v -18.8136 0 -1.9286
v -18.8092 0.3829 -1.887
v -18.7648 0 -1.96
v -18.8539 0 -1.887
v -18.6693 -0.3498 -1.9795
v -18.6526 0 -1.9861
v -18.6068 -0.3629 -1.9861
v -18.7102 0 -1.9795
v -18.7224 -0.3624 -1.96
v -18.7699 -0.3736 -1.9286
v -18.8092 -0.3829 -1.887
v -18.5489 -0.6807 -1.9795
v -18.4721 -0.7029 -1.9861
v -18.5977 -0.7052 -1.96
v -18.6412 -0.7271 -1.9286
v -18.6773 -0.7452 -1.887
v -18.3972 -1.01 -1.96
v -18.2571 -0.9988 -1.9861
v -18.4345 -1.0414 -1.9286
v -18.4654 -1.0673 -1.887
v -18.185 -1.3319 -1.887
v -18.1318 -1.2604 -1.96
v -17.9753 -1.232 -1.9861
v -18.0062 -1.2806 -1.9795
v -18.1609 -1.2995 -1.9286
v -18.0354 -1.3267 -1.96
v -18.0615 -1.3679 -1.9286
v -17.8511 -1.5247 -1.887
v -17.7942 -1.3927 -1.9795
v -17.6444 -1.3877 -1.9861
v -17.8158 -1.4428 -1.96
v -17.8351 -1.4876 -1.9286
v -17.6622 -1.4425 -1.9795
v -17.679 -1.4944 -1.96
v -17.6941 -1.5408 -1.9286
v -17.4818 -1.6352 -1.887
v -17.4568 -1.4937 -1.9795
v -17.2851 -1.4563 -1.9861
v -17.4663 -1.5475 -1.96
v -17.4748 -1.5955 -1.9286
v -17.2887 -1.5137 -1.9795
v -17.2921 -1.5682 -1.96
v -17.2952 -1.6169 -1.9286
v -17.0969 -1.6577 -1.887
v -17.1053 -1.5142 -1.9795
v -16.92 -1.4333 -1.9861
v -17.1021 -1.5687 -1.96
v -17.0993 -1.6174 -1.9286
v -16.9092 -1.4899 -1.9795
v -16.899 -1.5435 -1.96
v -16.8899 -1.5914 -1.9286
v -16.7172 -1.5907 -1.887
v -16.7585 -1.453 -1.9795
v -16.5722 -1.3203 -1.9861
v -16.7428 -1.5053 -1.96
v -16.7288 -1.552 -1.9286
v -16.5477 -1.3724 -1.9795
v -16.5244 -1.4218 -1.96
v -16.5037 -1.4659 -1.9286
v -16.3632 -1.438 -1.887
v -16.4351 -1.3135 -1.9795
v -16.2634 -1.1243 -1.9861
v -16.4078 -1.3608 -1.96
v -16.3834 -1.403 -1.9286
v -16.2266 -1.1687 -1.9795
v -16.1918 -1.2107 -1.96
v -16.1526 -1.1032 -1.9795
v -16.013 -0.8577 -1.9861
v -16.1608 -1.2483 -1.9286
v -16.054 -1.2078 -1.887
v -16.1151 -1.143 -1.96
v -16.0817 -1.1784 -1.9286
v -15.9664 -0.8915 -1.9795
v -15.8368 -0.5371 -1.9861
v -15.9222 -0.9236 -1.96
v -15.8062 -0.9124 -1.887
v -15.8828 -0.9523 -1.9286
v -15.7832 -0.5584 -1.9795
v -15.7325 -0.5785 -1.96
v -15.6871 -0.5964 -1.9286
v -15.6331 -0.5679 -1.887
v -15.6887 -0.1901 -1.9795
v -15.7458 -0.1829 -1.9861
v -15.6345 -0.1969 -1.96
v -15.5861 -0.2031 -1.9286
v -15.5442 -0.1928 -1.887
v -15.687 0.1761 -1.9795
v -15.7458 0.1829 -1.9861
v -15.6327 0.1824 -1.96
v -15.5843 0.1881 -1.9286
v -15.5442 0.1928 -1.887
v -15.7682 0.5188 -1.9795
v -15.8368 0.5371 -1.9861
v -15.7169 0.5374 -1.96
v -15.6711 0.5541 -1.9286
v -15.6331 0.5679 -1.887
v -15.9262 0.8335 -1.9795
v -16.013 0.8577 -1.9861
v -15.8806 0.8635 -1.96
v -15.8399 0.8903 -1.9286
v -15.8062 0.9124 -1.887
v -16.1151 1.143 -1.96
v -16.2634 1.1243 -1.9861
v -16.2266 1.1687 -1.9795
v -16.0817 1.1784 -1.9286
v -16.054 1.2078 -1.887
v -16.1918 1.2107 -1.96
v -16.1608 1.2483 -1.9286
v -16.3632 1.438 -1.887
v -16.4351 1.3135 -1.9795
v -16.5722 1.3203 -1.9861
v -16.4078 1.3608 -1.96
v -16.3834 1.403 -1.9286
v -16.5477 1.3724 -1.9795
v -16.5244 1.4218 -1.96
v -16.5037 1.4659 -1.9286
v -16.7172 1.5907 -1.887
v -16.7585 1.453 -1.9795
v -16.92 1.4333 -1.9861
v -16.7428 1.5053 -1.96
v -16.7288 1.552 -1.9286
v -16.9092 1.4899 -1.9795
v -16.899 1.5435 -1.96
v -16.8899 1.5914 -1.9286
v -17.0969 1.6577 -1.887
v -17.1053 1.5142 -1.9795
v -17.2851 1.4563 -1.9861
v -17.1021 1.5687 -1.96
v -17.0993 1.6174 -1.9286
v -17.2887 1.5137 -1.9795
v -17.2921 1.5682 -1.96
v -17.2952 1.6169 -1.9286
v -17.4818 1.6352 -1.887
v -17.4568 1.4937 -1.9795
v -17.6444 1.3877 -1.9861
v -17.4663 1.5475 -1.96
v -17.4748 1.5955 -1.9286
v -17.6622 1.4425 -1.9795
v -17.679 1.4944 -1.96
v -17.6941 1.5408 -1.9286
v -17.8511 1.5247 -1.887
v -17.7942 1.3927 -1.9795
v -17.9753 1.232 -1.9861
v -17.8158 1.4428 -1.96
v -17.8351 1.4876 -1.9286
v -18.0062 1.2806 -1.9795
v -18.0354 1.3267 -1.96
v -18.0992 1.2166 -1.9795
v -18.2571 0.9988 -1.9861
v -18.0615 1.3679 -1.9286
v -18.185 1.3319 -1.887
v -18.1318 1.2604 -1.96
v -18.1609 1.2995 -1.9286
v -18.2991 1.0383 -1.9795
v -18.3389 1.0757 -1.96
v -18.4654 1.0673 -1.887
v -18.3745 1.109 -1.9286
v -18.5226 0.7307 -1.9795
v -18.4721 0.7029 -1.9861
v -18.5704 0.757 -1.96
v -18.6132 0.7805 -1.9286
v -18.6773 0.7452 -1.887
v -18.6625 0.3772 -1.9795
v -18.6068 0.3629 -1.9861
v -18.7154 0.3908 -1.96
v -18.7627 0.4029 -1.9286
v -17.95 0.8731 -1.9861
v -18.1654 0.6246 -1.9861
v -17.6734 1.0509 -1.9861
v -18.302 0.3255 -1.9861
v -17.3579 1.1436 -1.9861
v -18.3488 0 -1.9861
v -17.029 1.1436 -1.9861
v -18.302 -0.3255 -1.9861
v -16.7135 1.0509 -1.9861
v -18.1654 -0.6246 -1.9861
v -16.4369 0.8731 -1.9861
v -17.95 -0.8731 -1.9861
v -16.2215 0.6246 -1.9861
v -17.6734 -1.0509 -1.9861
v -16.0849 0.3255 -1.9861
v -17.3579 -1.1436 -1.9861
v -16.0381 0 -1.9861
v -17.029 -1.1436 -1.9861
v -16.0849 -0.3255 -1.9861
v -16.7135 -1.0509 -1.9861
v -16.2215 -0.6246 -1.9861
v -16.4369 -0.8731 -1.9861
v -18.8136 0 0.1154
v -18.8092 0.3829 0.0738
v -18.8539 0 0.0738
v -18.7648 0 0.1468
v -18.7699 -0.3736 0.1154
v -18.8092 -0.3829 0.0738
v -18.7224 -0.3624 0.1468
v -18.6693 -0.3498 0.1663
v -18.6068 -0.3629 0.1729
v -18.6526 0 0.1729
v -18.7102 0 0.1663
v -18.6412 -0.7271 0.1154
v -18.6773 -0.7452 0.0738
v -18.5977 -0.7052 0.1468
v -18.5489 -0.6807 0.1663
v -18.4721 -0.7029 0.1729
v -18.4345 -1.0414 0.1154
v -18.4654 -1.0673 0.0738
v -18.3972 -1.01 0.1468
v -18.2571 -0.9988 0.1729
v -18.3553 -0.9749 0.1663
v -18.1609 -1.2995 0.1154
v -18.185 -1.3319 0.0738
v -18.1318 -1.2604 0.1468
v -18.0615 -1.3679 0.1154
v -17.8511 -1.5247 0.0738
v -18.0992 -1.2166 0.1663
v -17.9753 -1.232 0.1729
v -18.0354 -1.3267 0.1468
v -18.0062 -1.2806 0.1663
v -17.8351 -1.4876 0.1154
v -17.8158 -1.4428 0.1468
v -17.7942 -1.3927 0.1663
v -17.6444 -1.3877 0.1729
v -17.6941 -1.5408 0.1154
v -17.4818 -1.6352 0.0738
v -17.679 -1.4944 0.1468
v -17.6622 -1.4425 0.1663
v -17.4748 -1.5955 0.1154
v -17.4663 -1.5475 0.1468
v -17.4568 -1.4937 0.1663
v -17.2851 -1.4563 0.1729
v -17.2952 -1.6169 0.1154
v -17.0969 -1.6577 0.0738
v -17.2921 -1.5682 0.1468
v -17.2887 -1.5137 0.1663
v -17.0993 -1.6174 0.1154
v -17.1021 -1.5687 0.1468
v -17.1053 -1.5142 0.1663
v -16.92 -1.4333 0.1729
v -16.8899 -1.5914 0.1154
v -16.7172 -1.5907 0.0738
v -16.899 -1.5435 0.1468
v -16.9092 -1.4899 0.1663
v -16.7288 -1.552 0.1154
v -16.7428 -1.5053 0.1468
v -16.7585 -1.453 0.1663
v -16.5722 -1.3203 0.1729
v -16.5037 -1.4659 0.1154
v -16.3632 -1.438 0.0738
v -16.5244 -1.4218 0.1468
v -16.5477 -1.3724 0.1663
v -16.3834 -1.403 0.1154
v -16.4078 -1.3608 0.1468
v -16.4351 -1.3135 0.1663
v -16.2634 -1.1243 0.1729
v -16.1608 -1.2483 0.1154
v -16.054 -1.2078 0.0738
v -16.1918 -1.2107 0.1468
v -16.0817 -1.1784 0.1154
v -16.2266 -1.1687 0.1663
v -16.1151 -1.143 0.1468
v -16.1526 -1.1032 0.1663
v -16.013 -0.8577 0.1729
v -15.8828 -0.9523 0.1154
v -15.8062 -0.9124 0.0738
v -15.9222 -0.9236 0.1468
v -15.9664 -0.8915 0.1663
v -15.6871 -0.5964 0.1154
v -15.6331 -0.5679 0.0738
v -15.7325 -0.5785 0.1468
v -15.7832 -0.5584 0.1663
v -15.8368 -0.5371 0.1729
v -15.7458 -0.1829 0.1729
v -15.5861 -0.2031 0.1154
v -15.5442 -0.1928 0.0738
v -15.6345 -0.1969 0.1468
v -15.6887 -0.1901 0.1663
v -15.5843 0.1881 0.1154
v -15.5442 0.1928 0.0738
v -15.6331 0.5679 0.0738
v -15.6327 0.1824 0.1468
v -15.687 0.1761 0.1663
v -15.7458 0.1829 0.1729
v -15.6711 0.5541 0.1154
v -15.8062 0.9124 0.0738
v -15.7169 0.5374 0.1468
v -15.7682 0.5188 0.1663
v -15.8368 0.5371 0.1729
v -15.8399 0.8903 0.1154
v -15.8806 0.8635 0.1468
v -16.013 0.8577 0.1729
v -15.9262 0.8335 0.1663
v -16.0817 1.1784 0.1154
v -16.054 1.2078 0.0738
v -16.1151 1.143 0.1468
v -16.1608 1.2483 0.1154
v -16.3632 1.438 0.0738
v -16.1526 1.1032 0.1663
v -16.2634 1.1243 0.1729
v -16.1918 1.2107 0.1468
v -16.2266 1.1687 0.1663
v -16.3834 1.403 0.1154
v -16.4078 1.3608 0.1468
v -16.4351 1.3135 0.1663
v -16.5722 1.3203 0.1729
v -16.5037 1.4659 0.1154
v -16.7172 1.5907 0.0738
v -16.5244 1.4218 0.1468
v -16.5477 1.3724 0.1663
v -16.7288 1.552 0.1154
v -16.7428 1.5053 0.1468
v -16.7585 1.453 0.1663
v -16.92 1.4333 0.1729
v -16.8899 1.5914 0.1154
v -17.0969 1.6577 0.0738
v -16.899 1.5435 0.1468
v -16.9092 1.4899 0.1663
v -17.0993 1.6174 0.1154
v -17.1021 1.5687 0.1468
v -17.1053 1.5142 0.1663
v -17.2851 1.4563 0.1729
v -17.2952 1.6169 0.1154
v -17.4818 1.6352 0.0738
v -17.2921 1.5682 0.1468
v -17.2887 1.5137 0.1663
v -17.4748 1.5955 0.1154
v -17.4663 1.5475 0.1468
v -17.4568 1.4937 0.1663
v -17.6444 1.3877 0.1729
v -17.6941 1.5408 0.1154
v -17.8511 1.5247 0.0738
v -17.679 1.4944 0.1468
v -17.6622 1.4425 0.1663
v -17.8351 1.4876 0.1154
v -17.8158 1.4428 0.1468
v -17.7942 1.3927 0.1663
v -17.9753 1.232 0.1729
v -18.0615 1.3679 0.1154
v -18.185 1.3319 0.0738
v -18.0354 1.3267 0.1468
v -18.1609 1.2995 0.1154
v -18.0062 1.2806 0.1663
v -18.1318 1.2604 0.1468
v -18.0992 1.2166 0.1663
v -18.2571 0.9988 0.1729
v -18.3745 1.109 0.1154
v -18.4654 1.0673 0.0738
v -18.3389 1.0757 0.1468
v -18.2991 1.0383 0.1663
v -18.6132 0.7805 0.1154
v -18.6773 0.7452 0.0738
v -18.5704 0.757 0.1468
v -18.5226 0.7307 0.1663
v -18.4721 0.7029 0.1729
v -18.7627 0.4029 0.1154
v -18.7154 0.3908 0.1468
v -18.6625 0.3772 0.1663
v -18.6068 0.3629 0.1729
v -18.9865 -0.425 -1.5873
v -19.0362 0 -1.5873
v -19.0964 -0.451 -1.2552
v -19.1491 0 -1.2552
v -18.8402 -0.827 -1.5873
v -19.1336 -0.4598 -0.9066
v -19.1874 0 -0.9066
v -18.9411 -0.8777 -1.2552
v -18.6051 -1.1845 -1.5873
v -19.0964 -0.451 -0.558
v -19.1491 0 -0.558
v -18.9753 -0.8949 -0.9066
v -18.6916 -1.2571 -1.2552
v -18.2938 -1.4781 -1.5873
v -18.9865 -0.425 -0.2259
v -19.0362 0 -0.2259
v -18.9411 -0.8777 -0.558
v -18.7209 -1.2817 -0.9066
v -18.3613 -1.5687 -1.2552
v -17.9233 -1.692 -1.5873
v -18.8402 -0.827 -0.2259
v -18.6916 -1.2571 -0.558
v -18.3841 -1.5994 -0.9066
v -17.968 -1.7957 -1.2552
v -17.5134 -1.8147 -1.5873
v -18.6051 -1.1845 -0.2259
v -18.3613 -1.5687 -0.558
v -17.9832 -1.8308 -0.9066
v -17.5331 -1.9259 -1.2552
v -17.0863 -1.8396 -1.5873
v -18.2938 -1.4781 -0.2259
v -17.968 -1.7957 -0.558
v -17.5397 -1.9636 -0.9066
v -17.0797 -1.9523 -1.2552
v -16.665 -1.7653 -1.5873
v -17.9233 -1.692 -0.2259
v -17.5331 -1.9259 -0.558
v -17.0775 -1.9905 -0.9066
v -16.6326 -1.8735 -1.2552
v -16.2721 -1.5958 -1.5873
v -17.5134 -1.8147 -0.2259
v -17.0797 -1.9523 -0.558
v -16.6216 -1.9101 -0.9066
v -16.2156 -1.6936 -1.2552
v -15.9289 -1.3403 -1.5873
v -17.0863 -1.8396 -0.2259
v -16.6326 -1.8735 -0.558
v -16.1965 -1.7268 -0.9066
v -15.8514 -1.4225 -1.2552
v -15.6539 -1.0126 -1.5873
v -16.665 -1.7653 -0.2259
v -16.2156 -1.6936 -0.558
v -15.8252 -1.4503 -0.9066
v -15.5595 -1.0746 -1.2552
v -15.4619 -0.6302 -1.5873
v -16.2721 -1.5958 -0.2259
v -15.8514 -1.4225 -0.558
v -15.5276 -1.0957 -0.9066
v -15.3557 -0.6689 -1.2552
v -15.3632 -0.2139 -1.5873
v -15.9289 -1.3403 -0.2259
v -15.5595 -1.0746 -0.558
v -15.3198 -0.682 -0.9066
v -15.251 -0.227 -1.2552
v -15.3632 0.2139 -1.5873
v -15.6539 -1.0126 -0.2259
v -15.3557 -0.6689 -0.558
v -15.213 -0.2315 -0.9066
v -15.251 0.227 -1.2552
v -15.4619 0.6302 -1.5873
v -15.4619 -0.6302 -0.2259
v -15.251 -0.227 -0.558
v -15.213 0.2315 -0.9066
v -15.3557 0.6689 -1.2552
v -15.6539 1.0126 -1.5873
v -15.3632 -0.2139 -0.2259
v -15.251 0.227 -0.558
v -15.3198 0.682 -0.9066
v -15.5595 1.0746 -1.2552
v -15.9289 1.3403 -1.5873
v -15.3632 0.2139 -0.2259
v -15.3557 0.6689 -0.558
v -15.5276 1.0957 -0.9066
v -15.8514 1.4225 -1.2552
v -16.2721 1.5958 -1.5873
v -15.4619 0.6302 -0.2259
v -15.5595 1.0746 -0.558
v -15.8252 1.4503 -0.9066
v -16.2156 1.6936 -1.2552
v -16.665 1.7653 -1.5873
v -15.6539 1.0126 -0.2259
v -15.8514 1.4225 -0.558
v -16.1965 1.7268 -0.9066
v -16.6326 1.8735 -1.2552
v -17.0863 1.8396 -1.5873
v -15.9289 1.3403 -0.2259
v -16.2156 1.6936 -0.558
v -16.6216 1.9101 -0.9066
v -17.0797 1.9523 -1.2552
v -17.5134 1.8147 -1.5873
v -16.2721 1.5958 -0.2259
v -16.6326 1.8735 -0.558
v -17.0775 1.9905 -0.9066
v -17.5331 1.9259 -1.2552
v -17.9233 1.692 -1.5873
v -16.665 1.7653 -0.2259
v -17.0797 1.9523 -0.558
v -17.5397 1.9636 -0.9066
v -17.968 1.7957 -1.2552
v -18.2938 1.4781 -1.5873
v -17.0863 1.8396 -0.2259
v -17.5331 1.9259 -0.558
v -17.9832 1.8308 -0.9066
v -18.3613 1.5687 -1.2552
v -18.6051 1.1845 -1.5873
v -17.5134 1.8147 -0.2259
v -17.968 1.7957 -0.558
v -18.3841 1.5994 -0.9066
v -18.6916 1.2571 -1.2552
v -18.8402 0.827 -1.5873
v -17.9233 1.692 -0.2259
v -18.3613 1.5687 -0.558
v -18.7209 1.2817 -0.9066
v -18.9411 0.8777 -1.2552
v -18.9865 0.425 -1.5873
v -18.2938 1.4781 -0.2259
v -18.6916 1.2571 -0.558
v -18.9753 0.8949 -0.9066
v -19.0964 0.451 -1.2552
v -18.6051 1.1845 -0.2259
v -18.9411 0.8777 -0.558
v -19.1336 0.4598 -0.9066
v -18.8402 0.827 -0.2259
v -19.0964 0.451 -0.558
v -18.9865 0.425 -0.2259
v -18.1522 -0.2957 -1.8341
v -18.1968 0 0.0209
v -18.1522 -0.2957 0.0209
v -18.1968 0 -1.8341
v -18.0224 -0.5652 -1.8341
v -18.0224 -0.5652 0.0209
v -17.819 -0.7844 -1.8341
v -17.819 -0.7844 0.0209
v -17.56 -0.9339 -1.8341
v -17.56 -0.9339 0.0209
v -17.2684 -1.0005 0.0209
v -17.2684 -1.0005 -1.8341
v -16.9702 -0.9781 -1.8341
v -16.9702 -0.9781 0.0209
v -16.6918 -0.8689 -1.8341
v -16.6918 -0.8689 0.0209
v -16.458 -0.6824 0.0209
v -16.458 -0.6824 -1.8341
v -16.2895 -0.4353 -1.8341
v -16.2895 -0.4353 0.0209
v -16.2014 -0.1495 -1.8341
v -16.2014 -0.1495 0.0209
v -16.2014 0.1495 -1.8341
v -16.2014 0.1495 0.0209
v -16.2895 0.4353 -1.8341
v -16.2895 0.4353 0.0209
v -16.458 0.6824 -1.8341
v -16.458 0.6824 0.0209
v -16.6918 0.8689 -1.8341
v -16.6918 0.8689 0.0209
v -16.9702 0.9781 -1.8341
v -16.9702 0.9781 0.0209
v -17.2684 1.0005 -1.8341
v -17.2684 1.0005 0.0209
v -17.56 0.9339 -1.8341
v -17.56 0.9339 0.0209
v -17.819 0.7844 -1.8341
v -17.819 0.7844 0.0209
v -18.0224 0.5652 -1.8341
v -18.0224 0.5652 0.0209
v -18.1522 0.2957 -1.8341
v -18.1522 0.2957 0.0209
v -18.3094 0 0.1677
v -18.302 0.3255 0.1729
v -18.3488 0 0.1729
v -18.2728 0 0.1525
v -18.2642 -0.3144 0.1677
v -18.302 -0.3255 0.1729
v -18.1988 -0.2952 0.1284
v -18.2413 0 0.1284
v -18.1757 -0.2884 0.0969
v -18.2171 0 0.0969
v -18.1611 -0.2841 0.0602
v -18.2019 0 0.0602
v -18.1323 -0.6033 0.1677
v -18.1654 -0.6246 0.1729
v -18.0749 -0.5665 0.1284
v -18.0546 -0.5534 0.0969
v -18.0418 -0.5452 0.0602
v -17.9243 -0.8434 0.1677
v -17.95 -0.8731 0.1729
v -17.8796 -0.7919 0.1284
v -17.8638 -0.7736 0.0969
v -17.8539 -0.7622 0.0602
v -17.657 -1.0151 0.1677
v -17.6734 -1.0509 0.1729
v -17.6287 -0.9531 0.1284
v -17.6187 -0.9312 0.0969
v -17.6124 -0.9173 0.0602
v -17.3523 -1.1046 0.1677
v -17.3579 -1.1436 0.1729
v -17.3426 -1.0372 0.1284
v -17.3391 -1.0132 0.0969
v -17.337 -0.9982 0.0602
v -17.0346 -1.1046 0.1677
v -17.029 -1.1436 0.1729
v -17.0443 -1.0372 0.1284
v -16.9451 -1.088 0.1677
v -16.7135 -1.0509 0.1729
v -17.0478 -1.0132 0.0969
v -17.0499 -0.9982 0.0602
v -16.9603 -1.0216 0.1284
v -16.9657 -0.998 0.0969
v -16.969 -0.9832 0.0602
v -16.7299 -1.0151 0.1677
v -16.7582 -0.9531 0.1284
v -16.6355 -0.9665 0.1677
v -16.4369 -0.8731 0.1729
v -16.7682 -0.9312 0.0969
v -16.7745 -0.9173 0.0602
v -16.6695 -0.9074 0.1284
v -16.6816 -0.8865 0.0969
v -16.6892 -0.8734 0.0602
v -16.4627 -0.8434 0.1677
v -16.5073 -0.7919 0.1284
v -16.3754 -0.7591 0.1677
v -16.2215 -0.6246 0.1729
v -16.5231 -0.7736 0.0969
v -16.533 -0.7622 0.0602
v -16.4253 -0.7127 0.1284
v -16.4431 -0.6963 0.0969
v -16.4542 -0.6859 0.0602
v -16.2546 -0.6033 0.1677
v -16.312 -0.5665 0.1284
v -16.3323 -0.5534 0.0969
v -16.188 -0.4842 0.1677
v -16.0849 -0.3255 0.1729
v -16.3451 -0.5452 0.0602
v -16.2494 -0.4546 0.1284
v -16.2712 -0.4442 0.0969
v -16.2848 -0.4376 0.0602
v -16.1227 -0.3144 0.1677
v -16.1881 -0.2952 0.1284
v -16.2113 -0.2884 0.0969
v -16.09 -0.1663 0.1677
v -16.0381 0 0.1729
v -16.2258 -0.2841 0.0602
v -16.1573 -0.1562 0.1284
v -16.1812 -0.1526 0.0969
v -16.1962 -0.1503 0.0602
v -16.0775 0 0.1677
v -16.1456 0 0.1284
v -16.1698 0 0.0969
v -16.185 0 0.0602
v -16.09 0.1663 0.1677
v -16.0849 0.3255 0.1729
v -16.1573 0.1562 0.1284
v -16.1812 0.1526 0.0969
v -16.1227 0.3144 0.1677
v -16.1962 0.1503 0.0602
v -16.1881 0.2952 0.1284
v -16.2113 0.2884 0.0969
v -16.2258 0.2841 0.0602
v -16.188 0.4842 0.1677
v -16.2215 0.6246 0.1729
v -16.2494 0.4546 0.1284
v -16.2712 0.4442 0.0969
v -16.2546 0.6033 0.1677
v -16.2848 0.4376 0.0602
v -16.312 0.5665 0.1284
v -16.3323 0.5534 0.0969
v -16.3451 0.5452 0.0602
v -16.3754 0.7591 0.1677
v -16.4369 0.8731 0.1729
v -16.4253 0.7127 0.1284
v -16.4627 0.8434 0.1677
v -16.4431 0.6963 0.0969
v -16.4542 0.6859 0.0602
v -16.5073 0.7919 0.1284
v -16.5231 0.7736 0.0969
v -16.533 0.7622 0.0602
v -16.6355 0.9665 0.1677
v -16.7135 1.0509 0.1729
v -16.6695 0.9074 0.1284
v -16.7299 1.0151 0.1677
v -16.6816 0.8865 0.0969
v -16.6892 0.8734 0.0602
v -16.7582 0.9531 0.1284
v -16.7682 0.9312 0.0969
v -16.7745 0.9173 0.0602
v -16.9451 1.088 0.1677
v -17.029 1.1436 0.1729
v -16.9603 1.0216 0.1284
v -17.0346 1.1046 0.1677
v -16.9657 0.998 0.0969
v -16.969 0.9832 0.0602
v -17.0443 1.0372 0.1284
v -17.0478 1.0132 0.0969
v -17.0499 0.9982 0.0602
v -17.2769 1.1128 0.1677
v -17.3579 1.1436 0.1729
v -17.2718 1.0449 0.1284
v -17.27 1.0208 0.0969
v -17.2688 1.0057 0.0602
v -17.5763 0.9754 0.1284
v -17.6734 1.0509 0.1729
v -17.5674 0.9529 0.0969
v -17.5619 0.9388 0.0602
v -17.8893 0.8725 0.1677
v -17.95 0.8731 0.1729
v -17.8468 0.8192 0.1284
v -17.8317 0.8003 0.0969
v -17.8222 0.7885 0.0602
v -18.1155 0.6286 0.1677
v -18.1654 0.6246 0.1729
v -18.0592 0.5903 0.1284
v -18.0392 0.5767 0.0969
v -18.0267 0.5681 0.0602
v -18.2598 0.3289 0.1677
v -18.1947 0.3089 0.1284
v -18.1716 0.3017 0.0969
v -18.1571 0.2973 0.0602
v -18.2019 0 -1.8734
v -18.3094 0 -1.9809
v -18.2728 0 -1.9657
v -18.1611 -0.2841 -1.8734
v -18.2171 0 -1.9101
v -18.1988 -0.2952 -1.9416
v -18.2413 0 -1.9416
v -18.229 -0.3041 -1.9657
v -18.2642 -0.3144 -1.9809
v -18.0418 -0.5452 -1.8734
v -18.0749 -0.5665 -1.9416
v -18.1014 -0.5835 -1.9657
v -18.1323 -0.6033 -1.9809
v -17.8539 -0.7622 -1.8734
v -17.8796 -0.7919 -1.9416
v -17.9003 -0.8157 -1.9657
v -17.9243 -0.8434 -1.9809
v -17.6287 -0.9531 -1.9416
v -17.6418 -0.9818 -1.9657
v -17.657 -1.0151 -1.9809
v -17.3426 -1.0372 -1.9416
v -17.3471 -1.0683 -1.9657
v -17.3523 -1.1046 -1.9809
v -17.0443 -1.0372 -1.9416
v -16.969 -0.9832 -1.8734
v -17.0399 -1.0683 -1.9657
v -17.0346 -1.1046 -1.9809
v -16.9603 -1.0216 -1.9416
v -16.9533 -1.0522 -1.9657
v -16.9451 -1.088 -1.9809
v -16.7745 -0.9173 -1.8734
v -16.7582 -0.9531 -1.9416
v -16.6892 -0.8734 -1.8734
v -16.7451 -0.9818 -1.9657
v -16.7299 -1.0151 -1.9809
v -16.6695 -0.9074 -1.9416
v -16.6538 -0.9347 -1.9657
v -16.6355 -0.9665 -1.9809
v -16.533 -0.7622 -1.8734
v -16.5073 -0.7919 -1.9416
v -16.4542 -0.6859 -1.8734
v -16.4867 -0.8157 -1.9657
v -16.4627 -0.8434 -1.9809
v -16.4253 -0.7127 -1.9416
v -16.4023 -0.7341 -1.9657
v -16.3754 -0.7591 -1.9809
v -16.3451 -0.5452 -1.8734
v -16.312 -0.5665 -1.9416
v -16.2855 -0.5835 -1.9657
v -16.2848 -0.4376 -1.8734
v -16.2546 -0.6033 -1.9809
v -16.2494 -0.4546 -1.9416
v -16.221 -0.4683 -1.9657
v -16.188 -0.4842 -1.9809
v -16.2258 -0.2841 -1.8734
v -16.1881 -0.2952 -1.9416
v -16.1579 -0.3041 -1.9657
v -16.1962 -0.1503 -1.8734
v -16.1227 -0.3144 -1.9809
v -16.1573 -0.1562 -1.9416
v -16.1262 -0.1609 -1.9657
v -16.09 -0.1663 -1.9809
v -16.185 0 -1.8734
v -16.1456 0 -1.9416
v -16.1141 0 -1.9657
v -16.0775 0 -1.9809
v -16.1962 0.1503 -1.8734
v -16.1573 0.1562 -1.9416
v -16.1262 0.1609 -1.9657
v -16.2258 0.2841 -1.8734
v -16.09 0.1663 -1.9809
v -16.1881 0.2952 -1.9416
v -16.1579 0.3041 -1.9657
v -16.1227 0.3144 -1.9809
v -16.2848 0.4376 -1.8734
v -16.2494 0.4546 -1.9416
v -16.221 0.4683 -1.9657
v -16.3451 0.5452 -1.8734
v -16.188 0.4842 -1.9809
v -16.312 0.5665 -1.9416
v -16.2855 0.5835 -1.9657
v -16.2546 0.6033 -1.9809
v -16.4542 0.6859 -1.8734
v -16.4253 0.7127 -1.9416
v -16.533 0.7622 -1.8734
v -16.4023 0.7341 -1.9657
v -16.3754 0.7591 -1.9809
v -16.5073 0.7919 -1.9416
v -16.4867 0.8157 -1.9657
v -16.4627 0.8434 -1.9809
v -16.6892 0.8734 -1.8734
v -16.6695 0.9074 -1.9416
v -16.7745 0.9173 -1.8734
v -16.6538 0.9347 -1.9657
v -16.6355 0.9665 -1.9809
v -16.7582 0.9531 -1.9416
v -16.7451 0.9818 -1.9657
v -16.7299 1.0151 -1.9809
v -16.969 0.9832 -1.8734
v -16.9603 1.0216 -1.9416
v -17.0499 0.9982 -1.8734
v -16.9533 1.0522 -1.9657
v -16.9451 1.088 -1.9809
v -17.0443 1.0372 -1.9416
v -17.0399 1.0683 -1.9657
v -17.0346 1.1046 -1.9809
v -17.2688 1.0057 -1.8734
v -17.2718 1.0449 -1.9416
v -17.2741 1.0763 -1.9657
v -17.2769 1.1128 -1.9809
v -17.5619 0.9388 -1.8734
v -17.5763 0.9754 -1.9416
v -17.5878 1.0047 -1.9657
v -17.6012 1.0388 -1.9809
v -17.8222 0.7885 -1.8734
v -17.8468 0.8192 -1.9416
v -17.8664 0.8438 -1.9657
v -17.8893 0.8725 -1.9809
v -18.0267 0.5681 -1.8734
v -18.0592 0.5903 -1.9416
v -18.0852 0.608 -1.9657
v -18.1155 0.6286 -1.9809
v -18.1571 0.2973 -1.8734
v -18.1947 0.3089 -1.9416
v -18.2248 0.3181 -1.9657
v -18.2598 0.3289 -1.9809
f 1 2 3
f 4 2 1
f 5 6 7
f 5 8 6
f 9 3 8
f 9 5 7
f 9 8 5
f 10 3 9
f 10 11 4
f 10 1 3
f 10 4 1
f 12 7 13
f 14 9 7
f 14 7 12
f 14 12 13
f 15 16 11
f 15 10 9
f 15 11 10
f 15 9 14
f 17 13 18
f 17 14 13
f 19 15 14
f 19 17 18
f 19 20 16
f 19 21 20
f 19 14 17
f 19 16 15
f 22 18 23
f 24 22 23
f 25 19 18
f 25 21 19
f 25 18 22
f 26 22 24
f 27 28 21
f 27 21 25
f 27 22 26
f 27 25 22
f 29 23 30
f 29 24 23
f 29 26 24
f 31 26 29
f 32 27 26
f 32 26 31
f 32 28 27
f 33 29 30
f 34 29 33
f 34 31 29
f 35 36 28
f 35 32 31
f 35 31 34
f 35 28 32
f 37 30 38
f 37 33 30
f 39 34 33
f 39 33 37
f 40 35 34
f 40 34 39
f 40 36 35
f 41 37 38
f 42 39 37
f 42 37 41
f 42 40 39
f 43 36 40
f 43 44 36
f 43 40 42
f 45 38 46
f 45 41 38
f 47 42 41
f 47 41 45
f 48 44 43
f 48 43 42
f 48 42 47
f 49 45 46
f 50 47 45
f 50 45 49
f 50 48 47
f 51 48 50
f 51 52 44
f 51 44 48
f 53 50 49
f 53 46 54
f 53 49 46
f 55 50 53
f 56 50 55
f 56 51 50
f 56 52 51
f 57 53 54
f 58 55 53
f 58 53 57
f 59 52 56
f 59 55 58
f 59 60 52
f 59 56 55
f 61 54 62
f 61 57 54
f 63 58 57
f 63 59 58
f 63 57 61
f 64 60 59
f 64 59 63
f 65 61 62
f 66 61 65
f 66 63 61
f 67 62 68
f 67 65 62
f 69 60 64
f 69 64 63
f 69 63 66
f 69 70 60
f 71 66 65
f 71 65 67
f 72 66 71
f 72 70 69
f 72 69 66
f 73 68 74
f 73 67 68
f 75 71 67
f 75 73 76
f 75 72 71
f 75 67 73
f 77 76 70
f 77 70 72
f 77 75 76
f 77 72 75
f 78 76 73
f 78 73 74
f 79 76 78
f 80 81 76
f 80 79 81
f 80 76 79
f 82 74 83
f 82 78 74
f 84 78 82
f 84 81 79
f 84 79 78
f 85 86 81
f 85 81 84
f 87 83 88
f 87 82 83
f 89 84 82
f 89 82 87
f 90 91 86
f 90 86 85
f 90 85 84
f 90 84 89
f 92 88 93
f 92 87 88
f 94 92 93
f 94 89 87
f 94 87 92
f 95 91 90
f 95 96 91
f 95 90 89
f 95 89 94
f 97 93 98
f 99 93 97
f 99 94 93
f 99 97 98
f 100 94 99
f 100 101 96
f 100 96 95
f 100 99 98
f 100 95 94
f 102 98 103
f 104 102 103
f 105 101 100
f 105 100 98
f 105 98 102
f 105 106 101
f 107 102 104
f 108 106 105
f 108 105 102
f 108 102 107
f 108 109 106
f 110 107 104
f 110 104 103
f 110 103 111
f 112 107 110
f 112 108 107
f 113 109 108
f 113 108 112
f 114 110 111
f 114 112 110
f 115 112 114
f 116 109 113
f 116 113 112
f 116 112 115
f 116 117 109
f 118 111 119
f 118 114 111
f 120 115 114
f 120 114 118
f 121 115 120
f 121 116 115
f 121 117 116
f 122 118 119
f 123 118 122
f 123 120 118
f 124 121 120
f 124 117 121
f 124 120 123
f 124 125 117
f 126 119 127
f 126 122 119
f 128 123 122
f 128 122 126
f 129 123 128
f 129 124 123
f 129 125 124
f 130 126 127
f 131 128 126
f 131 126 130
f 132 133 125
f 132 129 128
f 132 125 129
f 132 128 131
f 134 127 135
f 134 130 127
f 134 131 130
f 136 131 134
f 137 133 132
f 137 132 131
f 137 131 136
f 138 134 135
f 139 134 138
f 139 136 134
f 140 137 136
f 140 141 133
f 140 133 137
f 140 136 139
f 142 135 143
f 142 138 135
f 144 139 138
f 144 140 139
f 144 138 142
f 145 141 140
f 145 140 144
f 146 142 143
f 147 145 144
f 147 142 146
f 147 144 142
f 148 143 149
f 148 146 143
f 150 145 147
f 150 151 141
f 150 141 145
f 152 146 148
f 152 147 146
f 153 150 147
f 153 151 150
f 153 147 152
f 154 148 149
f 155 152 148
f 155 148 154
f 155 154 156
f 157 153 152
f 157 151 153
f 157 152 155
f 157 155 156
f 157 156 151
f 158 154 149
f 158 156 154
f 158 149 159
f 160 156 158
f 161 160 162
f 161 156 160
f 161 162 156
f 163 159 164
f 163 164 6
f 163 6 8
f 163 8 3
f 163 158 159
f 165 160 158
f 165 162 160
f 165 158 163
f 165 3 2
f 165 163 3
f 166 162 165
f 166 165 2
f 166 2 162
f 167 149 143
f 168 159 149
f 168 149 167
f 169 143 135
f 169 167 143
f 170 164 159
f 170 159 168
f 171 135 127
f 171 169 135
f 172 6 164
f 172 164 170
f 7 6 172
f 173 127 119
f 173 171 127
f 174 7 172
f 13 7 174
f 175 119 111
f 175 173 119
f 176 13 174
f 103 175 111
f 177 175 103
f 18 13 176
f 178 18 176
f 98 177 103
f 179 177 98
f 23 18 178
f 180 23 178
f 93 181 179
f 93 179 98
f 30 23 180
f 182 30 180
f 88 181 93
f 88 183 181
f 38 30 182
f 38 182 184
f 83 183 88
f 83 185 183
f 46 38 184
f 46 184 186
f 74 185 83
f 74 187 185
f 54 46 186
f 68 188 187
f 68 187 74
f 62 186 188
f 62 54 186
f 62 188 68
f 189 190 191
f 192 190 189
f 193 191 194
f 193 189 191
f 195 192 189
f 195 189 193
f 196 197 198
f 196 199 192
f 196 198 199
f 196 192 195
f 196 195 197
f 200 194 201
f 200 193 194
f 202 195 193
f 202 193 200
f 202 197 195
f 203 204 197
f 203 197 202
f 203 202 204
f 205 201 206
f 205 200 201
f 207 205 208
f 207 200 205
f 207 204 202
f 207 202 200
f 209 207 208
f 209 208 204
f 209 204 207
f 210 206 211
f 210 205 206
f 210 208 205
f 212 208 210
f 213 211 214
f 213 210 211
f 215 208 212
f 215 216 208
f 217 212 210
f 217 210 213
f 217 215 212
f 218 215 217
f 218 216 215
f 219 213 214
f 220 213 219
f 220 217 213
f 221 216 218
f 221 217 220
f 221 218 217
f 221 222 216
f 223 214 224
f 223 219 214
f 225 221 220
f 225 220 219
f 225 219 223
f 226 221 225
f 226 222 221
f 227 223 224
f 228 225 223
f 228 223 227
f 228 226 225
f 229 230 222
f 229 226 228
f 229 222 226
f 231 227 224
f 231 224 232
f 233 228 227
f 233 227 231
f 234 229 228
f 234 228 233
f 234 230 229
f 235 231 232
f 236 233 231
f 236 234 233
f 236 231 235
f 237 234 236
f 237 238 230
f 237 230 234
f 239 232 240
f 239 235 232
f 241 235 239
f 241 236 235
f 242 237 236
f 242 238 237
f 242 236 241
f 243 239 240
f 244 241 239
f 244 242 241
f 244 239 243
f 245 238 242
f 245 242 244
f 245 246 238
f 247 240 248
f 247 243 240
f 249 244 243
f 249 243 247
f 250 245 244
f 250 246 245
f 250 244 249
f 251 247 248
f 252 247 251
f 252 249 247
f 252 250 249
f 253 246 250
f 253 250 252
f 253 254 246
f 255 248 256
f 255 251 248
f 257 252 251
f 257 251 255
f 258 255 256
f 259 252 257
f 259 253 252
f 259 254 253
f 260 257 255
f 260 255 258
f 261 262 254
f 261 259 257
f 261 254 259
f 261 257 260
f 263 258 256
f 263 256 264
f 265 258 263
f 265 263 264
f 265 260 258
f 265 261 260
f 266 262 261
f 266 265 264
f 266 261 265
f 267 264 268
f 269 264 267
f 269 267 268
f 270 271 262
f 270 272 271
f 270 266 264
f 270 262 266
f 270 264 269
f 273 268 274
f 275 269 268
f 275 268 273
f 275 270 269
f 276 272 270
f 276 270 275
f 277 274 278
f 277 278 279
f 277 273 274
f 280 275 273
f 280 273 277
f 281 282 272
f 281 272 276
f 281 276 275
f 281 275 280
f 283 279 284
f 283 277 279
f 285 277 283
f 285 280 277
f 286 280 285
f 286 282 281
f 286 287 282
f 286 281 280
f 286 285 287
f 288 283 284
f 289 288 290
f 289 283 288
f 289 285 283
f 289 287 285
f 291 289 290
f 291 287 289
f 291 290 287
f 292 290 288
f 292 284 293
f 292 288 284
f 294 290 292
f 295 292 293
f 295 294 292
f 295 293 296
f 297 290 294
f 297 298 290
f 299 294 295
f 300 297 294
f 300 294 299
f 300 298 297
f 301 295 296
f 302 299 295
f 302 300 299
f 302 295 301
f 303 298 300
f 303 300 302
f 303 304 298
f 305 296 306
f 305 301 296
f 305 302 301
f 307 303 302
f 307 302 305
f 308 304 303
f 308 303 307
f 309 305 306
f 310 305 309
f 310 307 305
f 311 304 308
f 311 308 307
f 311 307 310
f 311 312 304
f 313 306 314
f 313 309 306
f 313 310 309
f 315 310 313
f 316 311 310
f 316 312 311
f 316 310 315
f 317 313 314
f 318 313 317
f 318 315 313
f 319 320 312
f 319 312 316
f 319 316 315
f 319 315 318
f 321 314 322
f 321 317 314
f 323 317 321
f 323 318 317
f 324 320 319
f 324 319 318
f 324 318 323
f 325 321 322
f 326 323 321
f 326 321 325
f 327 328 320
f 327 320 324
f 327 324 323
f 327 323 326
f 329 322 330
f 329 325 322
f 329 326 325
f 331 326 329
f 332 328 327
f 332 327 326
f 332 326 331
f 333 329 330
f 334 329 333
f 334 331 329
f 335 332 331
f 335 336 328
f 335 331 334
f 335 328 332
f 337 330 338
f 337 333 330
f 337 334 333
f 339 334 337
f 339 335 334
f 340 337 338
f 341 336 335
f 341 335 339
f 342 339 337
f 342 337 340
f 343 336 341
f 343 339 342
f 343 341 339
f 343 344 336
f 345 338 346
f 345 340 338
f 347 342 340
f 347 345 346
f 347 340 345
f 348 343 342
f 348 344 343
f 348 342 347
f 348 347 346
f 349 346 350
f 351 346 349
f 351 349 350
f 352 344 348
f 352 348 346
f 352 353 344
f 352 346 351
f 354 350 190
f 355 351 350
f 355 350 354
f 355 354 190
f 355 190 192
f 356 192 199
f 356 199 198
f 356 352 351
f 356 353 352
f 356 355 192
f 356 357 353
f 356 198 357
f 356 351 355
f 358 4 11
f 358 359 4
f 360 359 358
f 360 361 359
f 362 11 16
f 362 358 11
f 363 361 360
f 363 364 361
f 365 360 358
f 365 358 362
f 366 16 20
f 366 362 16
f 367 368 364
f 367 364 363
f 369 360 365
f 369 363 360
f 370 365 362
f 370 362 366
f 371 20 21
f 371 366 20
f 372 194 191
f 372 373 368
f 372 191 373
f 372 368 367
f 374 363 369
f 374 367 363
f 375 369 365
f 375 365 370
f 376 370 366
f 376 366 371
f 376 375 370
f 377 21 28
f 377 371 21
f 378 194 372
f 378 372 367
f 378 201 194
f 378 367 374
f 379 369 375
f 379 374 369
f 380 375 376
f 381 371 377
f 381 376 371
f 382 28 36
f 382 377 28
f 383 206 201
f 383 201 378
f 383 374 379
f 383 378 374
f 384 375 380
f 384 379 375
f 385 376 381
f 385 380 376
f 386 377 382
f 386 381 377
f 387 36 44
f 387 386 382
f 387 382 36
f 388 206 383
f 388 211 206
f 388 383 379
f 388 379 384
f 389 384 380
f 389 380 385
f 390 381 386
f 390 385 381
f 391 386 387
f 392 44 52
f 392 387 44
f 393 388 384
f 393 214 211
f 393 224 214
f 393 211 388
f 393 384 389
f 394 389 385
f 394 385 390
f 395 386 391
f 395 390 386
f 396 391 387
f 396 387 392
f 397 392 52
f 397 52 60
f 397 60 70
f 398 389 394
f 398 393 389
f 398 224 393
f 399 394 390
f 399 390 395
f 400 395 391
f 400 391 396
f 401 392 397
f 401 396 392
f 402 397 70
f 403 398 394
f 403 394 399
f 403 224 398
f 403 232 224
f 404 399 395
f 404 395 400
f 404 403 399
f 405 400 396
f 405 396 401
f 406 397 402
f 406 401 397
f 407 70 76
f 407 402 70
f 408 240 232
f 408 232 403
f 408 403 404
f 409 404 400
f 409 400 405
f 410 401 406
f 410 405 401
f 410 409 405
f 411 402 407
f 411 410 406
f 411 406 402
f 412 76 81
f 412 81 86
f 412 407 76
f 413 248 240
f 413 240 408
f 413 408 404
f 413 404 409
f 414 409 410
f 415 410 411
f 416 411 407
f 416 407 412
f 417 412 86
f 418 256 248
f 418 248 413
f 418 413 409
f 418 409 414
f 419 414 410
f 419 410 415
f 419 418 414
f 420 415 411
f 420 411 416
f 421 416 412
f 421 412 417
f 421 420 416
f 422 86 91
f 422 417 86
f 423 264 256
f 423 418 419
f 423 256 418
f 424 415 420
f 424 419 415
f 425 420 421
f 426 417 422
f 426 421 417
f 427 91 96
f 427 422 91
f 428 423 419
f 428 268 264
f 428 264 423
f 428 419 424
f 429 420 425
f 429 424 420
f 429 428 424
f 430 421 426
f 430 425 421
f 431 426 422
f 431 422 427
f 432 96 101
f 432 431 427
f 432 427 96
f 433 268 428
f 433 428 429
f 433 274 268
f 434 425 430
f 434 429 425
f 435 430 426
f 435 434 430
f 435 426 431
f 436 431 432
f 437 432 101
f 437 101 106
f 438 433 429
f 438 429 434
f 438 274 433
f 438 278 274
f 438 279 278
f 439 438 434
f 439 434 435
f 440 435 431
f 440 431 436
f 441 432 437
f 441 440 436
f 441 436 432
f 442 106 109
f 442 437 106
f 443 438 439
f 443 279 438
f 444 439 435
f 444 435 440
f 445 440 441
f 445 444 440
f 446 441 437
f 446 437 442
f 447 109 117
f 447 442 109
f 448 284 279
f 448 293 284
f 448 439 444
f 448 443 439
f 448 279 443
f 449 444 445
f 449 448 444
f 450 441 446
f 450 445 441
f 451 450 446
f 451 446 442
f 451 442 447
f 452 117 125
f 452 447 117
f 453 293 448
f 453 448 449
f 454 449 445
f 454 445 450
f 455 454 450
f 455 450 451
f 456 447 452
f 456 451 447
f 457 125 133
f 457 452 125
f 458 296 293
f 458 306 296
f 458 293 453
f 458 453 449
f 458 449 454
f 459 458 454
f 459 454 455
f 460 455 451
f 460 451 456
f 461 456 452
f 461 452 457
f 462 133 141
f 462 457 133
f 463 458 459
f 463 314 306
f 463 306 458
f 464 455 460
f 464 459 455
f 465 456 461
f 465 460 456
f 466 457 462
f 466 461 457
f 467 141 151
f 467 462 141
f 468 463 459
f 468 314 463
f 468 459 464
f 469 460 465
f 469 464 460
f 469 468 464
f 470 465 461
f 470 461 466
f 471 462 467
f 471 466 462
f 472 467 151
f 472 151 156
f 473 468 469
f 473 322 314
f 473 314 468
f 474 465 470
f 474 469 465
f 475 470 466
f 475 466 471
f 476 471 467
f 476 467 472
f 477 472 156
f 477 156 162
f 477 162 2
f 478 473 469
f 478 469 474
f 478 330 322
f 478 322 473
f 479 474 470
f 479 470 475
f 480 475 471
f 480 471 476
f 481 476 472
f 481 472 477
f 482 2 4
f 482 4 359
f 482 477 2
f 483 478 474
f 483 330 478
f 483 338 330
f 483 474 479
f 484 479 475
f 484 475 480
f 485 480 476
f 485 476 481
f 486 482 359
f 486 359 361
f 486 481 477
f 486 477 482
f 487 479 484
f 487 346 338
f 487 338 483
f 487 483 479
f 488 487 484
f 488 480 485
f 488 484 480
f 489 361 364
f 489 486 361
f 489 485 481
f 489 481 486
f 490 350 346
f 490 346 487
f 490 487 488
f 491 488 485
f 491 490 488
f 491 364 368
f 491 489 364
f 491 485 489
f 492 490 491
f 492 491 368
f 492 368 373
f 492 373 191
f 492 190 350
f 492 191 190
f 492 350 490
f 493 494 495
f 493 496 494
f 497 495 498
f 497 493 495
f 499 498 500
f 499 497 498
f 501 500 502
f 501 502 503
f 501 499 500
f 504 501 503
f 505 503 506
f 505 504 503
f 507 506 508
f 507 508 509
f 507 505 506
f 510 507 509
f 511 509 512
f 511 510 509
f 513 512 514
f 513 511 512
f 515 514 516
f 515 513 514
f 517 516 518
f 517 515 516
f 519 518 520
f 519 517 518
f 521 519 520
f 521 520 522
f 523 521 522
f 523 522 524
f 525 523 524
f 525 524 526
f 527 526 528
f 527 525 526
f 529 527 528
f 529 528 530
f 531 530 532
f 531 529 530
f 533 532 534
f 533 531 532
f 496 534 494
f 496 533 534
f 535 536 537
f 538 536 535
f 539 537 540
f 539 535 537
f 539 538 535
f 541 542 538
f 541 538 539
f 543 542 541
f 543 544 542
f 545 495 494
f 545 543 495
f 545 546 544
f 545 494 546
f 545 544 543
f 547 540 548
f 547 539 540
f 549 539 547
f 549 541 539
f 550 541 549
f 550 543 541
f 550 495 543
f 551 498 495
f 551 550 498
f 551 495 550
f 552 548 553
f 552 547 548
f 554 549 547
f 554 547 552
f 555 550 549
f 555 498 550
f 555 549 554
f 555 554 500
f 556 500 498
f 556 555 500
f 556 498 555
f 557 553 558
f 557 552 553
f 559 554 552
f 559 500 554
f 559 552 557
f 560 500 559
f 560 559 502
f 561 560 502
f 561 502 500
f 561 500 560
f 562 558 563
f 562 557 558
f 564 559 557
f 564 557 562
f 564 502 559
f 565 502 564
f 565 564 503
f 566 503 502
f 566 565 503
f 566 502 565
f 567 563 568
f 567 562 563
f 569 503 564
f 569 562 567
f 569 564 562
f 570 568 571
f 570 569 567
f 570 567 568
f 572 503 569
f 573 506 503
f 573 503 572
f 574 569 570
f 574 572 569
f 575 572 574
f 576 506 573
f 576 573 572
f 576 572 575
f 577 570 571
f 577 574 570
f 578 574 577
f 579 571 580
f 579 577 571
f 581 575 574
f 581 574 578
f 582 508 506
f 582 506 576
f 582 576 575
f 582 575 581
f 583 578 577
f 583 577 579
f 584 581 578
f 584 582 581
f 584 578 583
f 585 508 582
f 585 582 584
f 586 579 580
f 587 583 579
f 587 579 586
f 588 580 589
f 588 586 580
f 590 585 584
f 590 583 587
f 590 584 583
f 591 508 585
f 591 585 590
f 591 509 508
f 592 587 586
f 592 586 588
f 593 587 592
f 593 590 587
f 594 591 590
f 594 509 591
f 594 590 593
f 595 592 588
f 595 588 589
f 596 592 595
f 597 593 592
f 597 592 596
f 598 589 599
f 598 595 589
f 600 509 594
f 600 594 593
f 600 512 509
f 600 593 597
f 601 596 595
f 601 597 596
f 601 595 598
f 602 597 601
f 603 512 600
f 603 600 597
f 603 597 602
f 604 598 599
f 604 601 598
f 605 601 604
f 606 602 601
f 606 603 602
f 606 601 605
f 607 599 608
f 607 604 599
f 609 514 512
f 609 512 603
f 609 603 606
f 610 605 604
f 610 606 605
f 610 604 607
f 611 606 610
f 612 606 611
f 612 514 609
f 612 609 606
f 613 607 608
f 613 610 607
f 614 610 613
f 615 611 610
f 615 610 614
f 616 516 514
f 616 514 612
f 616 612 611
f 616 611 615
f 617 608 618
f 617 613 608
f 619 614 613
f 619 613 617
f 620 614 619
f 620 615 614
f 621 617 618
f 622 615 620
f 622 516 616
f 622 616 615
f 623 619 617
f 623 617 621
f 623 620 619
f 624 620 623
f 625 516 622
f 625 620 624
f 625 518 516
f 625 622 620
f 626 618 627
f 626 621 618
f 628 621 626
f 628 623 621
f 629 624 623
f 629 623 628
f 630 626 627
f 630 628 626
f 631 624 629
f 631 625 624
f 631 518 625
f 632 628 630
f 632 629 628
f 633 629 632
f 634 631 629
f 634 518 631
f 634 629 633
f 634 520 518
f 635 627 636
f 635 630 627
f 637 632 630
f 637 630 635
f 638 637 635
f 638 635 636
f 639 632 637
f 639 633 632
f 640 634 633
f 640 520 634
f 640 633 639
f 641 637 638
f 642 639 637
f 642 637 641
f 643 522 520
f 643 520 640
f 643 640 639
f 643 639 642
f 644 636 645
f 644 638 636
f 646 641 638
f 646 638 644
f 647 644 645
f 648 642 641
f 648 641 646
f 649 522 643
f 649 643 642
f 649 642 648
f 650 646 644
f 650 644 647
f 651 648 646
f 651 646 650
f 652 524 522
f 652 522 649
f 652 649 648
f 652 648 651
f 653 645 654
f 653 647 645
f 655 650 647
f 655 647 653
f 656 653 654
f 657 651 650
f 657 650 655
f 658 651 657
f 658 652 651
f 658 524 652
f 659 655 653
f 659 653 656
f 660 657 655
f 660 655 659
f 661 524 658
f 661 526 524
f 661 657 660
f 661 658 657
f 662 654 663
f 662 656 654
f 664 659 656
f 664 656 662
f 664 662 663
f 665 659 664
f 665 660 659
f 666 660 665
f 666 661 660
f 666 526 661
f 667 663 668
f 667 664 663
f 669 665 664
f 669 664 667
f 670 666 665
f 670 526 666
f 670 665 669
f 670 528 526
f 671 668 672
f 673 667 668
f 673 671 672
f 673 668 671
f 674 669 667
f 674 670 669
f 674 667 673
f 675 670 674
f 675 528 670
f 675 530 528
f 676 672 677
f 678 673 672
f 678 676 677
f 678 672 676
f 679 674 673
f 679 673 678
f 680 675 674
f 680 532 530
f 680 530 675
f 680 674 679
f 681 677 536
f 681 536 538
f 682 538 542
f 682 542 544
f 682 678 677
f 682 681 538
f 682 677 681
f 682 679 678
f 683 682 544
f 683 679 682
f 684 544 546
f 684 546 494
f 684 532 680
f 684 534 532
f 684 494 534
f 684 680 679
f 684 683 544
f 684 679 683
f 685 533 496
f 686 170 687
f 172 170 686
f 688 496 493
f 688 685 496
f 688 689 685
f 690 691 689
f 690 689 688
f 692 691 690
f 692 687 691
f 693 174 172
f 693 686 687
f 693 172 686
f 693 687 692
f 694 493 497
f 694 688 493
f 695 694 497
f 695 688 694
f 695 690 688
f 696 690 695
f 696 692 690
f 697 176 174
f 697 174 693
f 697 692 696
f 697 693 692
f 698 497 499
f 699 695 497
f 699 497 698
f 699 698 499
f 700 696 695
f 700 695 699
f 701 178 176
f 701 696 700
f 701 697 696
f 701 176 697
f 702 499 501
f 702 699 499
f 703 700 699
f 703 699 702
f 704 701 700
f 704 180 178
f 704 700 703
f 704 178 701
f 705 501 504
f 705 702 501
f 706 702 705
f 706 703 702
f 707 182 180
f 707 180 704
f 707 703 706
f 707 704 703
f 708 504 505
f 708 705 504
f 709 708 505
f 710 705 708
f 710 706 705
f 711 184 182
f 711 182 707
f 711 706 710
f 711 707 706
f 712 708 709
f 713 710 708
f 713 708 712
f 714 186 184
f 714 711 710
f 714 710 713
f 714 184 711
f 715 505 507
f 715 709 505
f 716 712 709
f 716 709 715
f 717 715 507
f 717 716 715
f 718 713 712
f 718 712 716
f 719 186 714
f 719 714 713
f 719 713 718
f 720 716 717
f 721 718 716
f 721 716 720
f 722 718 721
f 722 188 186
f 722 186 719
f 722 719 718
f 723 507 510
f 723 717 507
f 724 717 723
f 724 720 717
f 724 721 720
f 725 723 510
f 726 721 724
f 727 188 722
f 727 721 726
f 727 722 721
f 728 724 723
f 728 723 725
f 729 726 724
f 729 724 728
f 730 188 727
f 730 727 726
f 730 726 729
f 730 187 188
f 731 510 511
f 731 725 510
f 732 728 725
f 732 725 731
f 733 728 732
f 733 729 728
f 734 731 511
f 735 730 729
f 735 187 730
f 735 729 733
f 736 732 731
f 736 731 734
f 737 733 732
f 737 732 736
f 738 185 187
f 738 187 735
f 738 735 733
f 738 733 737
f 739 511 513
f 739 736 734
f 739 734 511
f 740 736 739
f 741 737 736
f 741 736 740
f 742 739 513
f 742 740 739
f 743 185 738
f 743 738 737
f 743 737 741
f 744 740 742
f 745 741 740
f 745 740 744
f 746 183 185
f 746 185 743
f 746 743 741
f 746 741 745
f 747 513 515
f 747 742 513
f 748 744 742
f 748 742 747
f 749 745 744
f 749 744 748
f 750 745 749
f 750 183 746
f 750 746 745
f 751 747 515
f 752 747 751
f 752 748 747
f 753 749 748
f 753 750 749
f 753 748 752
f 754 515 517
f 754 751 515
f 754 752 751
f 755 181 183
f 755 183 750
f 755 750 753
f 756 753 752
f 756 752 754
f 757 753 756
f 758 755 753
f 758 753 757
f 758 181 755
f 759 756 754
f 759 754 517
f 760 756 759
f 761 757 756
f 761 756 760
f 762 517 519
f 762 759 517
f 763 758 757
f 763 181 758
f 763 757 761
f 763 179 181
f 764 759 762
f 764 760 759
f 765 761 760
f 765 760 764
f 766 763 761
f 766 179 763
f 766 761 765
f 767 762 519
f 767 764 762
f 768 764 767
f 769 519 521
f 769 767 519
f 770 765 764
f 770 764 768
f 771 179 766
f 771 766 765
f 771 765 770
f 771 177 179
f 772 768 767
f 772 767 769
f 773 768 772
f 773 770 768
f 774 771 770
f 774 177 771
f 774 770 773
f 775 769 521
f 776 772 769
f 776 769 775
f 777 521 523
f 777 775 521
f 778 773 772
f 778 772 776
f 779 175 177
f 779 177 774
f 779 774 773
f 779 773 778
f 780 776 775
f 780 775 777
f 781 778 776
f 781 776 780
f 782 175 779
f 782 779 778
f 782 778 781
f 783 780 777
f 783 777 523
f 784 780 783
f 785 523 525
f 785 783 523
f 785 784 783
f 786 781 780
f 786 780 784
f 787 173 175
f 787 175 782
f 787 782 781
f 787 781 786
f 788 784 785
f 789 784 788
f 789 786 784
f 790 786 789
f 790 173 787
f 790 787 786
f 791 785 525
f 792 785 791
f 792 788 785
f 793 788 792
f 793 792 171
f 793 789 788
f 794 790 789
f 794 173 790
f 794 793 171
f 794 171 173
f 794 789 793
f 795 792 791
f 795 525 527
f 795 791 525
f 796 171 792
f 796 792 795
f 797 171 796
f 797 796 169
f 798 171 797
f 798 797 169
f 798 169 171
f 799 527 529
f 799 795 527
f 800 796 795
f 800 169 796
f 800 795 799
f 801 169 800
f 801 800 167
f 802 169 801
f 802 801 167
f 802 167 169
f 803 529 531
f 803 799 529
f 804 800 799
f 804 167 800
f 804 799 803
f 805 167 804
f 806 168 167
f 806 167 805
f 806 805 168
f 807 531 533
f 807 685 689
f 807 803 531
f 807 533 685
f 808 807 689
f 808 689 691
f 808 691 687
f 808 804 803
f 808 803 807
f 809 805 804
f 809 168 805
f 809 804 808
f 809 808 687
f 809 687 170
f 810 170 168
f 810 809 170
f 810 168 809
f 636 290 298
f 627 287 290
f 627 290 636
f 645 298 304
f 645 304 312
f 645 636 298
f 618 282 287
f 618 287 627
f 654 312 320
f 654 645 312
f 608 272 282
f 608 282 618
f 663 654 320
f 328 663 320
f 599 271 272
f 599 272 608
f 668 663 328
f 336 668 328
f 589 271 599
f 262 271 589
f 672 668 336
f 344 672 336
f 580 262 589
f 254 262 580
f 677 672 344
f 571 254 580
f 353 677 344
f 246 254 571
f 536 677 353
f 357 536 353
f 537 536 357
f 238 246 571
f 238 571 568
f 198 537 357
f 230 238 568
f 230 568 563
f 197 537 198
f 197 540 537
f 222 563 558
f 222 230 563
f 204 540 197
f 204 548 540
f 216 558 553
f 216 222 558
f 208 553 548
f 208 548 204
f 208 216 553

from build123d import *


with BuildPart() as part:
    # Sketch1 → Revolve2 (revolve)
    with BuildSketch(Plane(origin=(0, 0, 0), x_dir=(1, 0, 0), z_dir=(0, 1, 0))):
        with BuildLine():
            ThreePointArc((-18.853923819, 1.88696354), (-19.187356805, 0.906600667), (-18.853923819, -0.073762206))
            ThreePointArc((-18.853923819, -0.073762206), (-18.764801529, -0.146771194), (-18.65259451, -0.172899333))
            Line((-18.65259451, -0.172899333), (-18.348771106, -0.172899333))
            ThreePointArc((-18.348771106, -0.172899333), (-18.241280763, -0.128375375), (-18.196756805, -0.020885032))
            Line((-18.196756805, -0.020885032), (-18.196756805, 1.834086366))
            ThreePointArc((-18.196756805, 1.834086366), (-18.241280763, 1.941576709), (-18.348771106, 1.986100667))
            Line((-18.348771106, 1.986100667), (-18.65259451, 1.986100667))
            ThreePointArc((-18.65259451, 1.986100667), (-18.764801529, 1.959972528), (-18.853923819, 1.88696354))
        make_face()
    revolve(axis=Axis((-17.193456805, 0, -1.490109452), (0, 0, 1)))


solid = part.part
